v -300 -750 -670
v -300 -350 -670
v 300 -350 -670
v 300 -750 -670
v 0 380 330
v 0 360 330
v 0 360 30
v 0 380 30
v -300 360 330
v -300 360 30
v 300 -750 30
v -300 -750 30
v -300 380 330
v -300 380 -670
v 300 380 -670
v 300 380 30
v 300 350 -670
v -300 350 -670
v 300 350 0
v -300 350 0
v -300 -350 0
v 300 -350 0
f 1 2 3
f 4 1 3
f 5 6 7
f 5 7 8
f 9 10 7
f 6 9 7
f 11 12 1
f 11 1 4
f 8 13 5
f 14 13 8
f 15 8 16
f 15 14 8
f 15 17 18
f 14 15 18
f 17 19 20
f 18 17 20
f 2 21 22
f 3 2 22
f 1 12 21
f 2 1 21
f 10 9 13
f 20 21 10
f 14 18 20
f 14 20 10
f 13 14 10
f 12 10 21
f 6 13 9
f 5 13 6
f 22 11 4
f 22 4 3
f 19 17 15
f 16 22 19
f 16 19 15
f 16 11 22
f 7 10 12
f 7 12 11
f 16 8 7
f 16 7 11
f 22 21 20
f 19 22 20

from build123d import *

# Parameters (mm, degrees)
SKETCH1_W           = 700
SKETCH1_H           = 600
BOSS_EXTRUDE1_DEPTH = 30
SKETCH2_W           = 600
SKETCH2_H           = 700
BOSS_EXTRUDE2_DEPTH = 30
SKETCH3_W           = 600
SKETCH3_H           = 400
BOSS_EXTRUDE3_DEPTH = 700
SKETCH4_W           = 300
SKETCH4_H           = 20
BOSS_EXTRUDE4_DEPTH = 300


with BuildPart() as part:
    # Sketch1 → Boss-Extrude1 (new body)
    with BuildSketch(Plane(origin=(0, 0, 0), x_dir=(0, 1, 0), z_dir=(0, 0, 1))):
        Rectangle(SKETCH1_W, SKETCH1_H)
    extrude(amount=BOSS_EXTRUDE1_DEPTH)

    # Sketch2 → Boss-Extrude2 (add)
    with BuildSketch(Plane(origin=(0, 350, 0), x_dir=(-1, 0, 0), z_dir=(0, 1, 0))):
        with Locations((0, -320)):
            Rectangle(SKETCH2_W, SKETCH2_H)
    extrude(amount=BOSS_EXTRUDE2_DEPTH)

    # Sketch3 → Boss-Extrude3 (add)
    with BuildSketch(Plane.XY.offset(30)):
        with Locations((0, -550)):
            Rectangle(SKETCH3_W, SKETCH3_H)
    extrude(amount=-BOSS_EXTRUDE3_DEPTH)

    # Sketch4 → Boss-Extrude4 (add)
    with BuildSketch(Plane.XY.offset(30)):
        with Locations((-150, 370)):
            Rectangle(SKETCH4_W, SKETCH4_H)
    extrude(amount=BOSS_EXTRUDE4_DEPTH)


solid = part.part
